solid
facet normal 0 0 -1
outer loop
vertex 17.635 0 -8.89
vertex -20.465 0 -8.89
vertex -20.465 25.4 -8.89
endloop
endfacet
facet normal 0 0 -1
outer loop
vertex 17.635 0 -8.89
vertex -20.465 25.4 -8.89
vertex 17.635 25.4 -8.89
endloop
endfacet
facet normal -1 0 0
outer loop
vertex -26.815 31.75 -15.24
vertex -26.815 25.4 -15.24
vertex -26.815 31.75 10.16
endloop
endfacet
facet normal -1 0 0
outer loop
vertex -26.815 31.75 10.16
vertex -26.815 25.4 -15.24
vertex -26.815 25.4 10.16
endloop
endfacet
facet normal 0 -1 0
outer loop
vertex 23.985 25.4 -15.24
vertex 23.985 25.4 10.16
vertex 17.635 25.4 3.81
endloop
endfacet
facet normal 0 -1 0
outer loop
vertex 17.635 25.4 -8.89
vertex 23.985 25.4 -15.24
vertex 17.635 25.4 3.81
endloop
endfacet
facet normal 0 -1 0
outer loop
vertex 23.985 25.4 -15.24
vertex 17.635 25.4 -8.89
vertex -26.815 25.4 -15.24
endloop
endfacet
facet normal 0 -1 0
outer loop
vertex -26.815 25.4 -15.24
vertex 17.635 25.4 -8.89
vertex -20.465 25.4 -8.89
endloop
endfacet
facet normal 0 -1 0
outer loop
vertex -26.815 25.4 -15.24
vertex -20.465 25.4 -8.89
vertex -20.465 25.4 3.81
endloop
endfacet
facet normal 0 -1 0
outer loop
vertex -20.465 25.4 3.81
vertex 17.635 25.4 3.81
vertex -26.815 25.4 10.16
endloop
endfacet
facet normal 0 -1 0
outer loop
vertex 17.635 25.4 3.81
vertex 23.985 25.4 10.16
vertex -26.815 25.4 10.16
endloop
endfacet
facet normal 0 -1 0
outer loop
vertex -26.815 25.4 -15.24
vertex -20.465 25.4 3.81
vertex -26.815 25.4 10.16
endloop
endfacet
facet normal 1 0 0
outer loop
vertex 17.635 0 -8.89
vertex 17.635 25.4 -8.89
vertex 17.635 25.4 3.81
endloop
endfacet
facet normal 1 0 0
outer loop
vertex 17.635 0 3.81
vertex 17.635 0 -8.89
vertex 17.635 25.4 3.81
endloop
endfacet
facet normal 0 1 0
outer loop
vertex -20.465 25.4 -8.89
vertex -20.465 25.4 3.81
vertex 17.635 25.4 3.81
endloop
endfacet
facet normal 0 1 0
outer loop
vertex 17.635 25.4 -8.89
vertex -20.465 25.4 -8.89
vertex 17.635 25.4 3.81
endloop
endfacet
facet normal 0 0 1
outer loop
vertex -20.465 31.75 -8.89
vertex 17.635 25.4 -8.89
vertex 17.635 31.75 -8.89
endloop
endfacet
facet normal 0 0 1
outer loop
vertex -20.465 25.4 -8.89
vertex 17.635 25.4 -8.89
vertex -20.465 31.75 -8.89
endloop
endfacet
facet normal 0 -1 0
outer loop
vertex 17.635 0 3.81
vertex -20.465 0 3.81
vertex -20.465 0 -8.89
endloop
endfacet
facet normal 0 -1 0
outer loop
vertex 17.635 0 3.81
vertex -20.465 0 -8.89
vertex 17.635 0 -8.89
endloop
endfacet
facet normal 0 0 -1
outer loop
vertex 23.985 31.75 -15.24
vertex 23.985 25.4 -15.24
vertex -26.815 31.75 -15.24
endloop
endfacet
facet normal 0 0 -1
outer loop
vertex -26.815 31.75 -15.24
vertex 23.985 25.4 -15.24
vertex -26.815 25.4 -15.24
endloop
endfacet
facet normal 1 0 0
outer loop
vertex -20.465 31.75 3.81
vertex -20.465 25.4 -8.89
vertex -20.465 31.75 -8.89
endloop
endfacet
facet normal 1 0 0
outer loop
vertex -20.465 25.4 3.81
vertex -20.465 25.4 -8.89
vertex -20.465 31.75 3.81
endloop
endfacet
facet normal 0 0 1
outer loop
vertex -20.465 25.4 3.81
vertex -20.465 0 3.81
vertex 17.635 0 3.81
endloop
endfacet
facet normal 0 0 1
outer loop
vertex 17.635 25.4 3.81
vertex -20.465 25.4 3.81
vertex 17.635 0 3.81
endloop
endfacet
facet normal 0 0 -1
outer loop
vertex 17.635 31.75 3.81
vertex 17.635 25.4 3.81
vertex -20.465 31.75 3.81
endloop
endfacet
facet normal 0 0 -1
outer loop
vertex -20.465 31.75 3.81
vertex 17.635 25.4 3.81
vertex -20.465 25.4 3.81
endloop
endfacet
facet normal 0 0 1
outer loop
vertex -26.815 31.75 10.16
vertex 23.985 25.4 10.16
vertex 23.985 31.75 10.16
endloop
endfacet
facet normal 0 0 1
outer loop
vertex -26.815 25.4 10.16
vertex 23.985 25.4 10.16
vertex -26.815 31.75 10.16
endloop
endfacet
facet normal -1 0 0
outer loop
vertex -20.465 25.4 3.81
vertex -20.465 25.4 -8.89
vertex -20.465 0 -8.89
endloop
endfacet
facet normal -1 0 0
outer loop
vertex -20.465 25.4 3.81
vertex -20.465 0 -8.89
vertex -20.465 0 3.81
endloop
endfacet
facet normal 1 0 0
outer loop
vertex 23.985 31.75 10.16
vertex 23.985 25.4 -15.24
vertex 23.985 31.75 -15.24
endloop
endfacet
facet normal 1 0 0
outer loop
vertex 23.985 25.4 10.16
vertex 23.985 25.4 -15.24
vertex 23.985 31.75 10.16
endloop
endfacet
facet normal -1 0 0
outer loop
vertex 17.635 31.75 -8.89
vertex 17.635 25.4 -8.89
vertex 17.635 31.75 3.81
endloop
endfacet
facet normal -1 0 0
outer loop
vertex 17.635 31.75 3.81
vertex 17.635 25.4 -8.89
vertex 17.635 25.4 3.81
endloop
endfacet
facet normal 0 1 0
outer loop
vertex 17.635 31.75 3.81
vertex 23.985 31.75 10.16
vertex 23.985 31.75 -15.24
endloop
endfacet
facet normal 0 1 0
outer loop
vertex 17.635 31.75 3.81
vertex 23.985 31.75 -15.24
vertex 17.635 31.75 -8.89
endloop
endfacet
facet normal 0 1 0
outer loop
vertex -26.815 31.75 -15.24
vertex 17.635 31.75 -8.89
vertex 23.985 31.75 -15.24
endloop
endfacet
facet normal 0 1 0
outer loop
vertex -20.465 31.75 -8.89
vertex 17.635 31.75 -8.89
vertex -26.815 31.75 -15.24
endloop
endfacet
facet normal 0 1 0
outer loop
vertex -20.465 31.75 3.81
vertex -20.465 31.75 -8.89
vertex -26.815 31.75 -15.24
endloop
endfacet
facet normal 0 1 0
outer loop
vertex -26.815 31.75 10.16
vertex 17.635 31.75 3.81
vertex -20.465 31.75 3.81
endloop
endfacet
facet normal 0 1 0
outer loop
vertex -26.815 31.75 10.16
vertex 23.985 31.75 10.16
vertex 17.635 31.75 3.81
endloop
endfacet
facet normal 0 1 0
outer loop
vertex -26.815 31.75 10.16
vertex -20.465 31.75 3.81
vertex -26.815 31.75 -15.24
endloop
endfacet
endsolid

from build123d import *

# Parameters (mm, degrees)
F0_W     = 38.1
F0_H     = 12.7
F1_DEPTH = 25.4
F2_W     = 50.8
F2_H     = 25.4
F2_W_2   = 38.1
F2_H_2   = 12.7
F3_DEPTH = 6.35


with BuildPart() as f1:
    # F0 (on Front) → F1 (new body)
    with BuildSketch(Plane.XZ):
        with Locations((-1.414714, -2.539574)):
            Rectangle(F0_W, F0_H)
    extrude(amount=-F1_DEPTH)


with BuildPart() as f3:
    # F2 (on face) → F3 (new body)
    with BuildSketch(Plane(origin=(0, 25.4, 0), x_dir=(-1, 0, 0), z_dir=(0, 1, 0))):
        with Locations((1.414714, -2.539574)):
            Rectangle(F2_W, F2_H)
        with Locations((1.414714, -2.539574)):
            Rectangle(F2_W_2, F2_H_2, mode=Mode.SUBTRACT)
    extrude(amount=F3_DEPTH)


solid = Compound([f1.part, f3.part])
